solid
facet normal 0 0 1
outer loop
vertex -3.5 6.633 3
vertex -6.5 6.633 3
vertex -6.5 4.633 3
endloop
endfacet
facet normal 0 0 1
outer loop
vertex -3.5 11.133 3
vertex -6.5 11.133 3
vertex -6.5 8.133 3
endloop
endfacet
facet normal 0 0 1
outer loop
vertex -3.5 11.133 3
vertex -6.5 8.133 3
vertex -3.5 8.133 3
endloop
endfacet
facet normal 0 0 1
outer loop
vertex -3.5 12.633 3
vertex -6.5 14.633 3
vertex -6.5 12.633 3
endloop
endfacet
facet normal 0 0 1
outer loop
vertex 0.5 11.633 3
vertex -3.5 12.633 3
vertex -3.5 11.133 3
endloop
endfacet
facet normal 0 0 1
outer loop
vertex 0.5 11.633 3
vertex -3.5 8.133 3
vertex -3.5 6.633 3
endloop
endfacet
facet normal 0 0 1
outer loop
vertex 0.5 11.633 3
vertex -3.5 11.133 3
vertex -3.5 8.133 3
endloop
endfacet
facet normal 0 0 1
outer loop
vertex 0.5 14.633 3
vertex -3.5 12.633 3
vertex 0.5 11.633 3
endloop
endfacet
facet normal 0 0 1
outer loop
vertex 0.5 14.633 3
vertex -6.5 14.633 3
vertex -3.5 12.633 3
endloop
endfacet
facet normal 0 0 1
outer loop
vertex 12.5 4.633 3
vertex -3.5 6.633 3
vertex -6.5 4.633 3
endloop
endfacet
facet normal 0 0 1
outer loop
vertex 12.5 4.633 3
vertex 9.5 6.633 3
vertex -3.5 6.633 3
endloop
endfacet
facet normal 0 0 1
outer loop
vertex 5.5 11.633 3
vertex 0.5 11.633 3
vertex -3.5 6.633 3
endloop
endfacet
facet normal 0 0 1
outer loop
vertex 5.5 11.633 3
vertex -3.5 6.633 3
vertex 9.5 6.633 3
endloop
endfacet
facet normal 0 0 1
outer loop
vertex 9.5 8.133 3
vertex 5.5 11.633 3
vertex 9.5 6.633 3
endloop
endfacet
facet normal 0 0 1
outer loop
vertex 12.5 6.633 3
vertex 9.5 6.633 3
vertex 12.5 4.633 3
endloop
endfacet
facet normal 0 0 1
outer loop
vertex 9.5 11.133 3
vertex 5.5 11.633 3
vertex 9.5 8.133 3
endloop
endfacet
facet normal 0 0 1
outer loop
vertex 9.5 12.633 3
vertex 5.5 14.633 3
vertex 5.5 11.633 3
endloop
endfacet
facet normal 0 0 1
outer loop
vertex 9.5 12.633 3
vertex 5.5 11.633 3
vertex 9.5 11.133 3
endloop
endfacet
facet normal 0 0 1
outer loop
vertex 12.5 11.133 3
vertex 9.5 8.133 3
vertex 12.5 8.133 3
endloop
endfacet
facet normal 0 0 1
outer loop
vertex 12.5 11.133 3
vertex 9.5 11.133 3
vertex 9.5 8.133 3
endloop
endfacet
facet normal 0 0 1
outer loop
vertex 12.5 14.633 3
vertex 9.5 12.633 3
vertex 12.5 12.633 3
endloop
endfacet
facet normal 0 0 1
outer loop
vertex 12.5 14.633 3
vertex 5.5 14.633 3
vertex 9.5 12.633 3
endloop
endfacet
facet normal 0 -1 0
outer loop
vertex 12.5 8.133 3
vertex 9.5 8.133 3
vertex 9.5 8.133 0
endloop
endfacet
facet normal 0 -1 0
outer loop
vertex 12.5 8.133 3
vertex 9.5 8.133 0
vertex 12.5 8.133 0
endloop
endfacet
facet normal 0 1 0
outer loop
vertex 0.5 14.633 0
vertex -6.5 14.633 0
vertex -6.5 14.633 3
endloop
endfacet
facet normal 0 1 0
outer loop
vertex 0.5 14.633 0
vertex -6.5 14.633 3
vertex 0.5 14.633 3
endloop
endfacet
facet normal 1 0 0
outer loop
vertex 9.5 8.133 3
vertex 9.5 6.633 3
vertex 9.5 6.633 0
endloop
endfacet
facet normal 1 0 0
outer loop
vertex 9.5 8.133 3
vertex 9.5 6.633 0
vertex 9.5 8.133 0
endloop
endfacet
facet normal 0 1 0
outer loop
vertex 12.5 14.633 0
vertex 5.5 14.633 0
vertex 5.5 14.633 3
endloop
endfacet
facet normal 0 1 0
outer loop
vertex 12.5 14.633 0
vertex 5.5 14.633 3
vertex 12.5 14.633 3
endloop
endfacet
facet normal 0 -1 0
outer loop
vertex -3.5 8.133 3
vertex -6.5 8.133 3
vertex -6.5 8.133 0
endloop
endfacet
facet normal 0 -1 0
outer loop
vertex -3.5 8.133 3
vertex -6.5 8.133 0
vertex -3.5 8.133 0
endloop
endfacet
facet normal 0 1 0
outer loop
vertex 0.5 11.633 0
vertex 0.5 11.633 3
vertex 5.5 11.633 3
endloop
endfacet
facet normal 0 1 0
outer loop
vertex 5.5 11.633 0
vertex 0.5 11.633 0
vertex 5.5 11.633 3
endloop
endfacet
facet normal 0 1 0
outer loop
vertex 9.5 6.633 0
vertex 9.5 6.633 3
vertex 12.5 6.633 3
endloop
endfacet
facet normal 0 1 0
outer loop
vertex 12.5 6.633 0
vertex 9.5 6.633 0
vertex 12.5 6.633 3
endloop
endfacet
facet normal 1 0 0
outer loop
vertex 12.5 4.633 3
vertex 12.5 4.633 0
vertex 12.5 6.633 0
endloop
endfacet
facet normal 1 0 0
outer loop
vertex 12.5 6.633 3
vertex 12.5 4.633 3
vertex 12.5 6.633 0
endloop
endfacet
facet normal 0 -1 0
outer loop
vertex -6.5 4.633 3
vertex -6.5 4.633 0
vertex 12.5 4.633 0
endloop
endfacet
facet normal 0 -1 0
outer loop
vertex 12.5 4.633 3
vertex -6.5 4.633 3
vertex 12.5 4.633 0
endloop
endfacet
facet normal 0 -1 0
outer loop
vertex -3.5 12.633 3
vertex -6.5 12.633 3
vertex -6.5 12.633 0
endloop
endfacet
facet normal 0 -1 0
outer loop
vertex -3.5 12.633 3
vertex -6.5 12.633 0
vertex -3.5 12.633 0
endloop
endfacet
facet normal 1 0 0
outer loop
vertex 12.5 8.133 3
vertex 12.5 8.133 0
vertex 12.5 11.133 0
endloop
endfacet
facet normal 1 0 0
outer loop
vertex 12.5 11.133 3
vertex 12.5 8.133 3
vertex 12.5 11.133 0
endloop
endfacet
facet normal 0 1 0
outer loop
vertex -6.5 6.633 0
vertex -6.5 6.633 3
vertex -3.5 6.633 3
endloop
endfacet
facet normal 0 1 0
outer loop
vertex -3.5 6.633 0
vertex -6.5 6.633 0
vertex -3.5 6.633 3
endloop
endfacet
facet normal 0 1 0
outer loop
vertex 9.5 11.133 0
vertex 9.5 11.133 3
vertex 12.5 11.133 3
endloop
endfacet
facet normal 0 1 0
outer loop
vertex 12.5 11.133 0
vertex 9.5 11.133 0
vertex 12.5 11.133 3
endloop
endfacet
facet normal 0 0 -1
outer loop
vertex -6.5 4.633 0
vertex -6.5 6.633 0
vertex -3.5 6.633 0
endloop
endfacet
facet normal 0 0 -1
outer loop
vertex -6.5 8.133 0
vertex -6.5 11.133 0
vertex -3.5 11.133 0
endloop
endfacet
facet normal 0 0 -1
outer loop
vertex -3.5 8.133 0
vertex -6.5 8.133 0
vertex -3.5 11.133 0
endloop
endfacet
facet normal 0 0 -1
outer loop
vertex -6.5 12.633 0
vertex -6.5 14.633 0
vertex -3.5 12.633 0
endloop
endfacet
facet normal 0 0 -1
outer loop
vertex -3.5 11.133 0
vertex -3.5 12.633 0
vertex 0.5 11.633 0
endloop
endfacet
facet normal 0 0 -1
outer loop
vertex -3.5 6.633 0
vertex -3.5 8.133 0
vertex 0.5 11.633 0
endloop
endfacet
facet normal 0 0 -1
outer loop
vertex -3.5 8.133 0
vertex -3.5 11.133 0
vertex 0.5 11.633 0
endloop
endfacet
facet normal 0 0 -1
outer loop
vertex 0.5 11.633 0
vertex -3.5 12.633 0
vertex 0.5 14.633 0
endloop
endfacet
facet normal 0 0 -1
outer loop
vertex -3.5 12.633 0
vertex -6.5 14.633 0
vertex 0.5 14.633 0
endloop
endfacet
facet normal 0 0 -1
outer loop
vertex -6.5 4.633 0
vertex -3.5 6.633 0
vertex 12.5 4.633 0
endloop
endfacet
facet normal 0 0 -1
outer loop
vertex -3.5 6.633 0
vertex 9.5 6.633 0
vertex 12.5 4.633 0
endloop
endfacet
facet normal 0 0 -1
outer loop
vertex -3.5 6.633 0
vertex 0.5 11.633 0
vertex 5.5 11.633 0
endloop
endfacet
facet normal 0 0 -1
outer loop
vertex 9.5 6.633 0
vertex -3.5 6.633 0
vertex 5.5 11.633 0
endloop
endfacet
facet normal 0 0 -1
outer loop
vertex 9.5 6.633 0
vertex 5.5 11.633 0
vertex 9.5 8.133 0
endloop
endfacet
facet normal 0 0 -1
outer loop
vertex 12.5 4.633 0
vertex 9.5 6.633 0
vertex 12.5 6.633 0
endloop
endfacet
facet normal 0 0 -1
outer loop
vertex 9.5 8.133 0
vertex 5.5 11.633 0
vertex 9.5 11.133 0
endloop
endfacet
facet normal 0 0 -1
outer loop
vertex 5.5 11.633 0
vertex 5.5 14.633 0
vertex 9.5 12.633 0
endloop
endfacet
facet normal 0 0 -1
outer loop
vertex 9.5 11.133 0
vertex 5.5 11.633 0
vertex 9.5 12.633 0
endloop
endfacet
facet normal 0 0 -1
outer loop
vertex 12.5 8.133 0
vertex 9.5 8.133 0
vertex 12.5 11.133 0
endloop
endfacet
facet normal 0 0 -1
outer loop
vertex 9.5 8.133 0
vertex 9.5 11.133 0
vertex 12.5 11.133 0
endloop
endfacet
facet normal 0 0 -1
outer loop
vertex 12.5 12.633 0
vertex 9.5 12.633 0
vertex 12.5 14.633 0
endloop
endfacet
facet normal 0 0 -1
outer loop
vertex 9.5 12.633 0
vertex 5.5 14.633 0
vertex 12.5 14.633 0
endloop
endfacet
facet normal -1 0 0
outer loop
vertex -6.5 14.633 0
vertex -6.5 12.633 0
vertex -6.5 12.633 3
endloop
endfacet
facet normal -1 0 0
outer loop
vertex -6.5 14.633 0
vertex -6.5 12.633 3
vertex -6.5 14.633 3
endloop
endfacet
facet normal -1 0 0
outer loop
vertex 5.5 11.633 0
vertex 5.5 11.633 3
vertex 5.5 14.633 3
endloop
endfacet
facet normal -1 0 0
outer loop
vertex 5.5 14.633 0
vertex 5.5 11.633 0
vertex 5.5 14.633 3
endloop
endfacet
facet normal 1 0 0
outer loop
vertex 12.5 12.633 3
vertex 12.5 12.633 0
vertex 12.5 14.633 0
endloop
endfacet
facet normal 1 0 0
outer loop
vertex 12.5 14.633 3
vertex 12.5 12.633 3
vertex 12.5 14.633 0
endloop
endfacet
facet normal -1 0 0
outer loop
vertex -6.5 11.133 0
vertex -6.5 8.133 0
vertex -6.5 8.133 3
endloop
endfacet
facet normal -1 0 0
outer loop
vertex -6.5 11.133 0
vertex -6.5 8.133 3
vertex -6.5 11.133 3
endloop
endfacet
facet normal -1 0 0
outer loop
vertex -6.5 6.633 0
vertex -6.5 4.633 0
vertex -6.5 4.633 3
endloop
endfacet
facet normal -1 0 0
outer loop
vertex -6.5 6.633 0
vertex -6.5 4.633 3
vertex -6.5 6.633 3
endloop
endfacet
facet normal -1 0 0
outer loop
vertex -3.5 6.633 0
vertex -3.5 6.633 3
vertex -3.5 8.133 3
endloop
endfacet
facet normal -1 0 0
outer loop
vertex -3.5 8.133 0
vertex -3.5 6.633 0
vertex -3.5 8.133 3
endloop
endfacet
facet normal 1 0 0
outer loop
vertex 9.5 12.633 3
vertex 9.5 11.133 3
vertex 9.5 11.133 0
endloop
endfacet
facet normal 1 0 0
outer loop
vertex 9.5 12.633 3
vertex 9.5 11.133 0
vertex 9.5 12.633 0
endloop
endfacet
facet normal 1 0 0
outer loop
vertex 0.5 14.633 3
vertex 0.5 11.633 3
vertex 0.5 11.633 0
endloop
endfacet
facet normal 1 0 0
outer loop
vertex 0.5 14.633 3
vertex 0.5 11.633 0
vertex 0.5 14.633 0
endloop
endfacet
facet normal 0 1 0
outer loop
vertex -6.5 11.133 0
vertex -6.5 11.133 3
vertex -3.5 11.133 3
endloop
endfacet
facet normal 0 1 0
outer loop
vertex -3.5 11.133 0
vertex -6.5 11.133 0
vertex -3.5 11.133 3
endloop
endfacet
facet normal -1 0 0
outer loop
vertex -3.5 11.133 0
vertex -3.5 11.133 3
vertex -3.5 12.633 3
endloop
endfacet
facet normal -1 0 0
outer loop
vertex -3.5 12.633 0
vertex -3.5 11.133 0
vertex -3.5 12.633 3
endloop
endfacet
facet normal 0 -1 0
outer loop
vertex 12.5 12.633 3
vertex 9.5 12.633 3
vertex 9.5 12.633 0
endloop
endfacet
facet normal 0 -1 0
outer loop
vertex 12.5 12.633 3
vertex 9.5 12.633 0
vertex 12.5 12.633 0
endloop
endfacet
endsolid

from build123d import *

# Parameters (mm, degrees)
SKETCH1_W           = 19
SKETCH1_H           = 10
BOSS_EXTRUDE1_DEPTH = 3
SKETCH2_W           = 3
SKETCH2_H           = 1.5
CUT_EXTRUDE1_DEPTH  = 3
SKETCH3_W           = 3
SKETCH3_H           = 1.5
CUT_EXTRUDE2_DEPTH  = 3
SKETCH5_W           = 5
SKETCH5_H           = 3
CUT_EXTRUDE6_DEPTH  = 3


with BuildPart() as part:
    # Sketch1 → Boss-Extrude1 (new body)
    with BuildSketch(Plane.XY):
        with Locations((3, 9.633458647)):
            Rectangle(SKETCH1_W, SKETCH1_H)
    extrude(amount=BOSS_EXTRUDE1_DEPTH)

    # Sketch2 → Cut-Extrude1 (cut)
    with BuildSketch(Plane.XY.offset(3)):
        with Locations((-5, 11.883458647)):
            Rectangle(SKETCH2_W, SKETCH2_H)
        with Locations((-5, 7.383458647)):
            Rectangle(SKETCH2_W, SKETCH2_H)
    extrude(amount=-CUT_EXTRUDE1_DEPTH, mode=Mode.SUBTRACT)

    # Sketch3 → Cut-Extrude2 (cut)
    with BuildSketch(Plane.XY.offset(3)):
        with Locations((11, 11.883458647)):
            Rectangle(SKETCH3_W, SKETCH3_H)
        with Locations((11, 7.383458647)):
            Rectangle(SKETCH3_W, SKETCH3_H)
    extrude(amount=-CUT_EXTRUDE2_DEPTH, mode=Mode.SUBTRACT)

    # Sketch5 → Cut-Extrude6 (cut)
    with BuildSketch(Plane.XY.offset(3)):
        with Locations((3, 13.133458647)):
            Rectangle(SKETCH5_W, SKETCH5_H)
    extrude(amount=-CUT_EXTRUDE6_DEPTH, mode=Mode.SUBTRACT)


solid = part.part
